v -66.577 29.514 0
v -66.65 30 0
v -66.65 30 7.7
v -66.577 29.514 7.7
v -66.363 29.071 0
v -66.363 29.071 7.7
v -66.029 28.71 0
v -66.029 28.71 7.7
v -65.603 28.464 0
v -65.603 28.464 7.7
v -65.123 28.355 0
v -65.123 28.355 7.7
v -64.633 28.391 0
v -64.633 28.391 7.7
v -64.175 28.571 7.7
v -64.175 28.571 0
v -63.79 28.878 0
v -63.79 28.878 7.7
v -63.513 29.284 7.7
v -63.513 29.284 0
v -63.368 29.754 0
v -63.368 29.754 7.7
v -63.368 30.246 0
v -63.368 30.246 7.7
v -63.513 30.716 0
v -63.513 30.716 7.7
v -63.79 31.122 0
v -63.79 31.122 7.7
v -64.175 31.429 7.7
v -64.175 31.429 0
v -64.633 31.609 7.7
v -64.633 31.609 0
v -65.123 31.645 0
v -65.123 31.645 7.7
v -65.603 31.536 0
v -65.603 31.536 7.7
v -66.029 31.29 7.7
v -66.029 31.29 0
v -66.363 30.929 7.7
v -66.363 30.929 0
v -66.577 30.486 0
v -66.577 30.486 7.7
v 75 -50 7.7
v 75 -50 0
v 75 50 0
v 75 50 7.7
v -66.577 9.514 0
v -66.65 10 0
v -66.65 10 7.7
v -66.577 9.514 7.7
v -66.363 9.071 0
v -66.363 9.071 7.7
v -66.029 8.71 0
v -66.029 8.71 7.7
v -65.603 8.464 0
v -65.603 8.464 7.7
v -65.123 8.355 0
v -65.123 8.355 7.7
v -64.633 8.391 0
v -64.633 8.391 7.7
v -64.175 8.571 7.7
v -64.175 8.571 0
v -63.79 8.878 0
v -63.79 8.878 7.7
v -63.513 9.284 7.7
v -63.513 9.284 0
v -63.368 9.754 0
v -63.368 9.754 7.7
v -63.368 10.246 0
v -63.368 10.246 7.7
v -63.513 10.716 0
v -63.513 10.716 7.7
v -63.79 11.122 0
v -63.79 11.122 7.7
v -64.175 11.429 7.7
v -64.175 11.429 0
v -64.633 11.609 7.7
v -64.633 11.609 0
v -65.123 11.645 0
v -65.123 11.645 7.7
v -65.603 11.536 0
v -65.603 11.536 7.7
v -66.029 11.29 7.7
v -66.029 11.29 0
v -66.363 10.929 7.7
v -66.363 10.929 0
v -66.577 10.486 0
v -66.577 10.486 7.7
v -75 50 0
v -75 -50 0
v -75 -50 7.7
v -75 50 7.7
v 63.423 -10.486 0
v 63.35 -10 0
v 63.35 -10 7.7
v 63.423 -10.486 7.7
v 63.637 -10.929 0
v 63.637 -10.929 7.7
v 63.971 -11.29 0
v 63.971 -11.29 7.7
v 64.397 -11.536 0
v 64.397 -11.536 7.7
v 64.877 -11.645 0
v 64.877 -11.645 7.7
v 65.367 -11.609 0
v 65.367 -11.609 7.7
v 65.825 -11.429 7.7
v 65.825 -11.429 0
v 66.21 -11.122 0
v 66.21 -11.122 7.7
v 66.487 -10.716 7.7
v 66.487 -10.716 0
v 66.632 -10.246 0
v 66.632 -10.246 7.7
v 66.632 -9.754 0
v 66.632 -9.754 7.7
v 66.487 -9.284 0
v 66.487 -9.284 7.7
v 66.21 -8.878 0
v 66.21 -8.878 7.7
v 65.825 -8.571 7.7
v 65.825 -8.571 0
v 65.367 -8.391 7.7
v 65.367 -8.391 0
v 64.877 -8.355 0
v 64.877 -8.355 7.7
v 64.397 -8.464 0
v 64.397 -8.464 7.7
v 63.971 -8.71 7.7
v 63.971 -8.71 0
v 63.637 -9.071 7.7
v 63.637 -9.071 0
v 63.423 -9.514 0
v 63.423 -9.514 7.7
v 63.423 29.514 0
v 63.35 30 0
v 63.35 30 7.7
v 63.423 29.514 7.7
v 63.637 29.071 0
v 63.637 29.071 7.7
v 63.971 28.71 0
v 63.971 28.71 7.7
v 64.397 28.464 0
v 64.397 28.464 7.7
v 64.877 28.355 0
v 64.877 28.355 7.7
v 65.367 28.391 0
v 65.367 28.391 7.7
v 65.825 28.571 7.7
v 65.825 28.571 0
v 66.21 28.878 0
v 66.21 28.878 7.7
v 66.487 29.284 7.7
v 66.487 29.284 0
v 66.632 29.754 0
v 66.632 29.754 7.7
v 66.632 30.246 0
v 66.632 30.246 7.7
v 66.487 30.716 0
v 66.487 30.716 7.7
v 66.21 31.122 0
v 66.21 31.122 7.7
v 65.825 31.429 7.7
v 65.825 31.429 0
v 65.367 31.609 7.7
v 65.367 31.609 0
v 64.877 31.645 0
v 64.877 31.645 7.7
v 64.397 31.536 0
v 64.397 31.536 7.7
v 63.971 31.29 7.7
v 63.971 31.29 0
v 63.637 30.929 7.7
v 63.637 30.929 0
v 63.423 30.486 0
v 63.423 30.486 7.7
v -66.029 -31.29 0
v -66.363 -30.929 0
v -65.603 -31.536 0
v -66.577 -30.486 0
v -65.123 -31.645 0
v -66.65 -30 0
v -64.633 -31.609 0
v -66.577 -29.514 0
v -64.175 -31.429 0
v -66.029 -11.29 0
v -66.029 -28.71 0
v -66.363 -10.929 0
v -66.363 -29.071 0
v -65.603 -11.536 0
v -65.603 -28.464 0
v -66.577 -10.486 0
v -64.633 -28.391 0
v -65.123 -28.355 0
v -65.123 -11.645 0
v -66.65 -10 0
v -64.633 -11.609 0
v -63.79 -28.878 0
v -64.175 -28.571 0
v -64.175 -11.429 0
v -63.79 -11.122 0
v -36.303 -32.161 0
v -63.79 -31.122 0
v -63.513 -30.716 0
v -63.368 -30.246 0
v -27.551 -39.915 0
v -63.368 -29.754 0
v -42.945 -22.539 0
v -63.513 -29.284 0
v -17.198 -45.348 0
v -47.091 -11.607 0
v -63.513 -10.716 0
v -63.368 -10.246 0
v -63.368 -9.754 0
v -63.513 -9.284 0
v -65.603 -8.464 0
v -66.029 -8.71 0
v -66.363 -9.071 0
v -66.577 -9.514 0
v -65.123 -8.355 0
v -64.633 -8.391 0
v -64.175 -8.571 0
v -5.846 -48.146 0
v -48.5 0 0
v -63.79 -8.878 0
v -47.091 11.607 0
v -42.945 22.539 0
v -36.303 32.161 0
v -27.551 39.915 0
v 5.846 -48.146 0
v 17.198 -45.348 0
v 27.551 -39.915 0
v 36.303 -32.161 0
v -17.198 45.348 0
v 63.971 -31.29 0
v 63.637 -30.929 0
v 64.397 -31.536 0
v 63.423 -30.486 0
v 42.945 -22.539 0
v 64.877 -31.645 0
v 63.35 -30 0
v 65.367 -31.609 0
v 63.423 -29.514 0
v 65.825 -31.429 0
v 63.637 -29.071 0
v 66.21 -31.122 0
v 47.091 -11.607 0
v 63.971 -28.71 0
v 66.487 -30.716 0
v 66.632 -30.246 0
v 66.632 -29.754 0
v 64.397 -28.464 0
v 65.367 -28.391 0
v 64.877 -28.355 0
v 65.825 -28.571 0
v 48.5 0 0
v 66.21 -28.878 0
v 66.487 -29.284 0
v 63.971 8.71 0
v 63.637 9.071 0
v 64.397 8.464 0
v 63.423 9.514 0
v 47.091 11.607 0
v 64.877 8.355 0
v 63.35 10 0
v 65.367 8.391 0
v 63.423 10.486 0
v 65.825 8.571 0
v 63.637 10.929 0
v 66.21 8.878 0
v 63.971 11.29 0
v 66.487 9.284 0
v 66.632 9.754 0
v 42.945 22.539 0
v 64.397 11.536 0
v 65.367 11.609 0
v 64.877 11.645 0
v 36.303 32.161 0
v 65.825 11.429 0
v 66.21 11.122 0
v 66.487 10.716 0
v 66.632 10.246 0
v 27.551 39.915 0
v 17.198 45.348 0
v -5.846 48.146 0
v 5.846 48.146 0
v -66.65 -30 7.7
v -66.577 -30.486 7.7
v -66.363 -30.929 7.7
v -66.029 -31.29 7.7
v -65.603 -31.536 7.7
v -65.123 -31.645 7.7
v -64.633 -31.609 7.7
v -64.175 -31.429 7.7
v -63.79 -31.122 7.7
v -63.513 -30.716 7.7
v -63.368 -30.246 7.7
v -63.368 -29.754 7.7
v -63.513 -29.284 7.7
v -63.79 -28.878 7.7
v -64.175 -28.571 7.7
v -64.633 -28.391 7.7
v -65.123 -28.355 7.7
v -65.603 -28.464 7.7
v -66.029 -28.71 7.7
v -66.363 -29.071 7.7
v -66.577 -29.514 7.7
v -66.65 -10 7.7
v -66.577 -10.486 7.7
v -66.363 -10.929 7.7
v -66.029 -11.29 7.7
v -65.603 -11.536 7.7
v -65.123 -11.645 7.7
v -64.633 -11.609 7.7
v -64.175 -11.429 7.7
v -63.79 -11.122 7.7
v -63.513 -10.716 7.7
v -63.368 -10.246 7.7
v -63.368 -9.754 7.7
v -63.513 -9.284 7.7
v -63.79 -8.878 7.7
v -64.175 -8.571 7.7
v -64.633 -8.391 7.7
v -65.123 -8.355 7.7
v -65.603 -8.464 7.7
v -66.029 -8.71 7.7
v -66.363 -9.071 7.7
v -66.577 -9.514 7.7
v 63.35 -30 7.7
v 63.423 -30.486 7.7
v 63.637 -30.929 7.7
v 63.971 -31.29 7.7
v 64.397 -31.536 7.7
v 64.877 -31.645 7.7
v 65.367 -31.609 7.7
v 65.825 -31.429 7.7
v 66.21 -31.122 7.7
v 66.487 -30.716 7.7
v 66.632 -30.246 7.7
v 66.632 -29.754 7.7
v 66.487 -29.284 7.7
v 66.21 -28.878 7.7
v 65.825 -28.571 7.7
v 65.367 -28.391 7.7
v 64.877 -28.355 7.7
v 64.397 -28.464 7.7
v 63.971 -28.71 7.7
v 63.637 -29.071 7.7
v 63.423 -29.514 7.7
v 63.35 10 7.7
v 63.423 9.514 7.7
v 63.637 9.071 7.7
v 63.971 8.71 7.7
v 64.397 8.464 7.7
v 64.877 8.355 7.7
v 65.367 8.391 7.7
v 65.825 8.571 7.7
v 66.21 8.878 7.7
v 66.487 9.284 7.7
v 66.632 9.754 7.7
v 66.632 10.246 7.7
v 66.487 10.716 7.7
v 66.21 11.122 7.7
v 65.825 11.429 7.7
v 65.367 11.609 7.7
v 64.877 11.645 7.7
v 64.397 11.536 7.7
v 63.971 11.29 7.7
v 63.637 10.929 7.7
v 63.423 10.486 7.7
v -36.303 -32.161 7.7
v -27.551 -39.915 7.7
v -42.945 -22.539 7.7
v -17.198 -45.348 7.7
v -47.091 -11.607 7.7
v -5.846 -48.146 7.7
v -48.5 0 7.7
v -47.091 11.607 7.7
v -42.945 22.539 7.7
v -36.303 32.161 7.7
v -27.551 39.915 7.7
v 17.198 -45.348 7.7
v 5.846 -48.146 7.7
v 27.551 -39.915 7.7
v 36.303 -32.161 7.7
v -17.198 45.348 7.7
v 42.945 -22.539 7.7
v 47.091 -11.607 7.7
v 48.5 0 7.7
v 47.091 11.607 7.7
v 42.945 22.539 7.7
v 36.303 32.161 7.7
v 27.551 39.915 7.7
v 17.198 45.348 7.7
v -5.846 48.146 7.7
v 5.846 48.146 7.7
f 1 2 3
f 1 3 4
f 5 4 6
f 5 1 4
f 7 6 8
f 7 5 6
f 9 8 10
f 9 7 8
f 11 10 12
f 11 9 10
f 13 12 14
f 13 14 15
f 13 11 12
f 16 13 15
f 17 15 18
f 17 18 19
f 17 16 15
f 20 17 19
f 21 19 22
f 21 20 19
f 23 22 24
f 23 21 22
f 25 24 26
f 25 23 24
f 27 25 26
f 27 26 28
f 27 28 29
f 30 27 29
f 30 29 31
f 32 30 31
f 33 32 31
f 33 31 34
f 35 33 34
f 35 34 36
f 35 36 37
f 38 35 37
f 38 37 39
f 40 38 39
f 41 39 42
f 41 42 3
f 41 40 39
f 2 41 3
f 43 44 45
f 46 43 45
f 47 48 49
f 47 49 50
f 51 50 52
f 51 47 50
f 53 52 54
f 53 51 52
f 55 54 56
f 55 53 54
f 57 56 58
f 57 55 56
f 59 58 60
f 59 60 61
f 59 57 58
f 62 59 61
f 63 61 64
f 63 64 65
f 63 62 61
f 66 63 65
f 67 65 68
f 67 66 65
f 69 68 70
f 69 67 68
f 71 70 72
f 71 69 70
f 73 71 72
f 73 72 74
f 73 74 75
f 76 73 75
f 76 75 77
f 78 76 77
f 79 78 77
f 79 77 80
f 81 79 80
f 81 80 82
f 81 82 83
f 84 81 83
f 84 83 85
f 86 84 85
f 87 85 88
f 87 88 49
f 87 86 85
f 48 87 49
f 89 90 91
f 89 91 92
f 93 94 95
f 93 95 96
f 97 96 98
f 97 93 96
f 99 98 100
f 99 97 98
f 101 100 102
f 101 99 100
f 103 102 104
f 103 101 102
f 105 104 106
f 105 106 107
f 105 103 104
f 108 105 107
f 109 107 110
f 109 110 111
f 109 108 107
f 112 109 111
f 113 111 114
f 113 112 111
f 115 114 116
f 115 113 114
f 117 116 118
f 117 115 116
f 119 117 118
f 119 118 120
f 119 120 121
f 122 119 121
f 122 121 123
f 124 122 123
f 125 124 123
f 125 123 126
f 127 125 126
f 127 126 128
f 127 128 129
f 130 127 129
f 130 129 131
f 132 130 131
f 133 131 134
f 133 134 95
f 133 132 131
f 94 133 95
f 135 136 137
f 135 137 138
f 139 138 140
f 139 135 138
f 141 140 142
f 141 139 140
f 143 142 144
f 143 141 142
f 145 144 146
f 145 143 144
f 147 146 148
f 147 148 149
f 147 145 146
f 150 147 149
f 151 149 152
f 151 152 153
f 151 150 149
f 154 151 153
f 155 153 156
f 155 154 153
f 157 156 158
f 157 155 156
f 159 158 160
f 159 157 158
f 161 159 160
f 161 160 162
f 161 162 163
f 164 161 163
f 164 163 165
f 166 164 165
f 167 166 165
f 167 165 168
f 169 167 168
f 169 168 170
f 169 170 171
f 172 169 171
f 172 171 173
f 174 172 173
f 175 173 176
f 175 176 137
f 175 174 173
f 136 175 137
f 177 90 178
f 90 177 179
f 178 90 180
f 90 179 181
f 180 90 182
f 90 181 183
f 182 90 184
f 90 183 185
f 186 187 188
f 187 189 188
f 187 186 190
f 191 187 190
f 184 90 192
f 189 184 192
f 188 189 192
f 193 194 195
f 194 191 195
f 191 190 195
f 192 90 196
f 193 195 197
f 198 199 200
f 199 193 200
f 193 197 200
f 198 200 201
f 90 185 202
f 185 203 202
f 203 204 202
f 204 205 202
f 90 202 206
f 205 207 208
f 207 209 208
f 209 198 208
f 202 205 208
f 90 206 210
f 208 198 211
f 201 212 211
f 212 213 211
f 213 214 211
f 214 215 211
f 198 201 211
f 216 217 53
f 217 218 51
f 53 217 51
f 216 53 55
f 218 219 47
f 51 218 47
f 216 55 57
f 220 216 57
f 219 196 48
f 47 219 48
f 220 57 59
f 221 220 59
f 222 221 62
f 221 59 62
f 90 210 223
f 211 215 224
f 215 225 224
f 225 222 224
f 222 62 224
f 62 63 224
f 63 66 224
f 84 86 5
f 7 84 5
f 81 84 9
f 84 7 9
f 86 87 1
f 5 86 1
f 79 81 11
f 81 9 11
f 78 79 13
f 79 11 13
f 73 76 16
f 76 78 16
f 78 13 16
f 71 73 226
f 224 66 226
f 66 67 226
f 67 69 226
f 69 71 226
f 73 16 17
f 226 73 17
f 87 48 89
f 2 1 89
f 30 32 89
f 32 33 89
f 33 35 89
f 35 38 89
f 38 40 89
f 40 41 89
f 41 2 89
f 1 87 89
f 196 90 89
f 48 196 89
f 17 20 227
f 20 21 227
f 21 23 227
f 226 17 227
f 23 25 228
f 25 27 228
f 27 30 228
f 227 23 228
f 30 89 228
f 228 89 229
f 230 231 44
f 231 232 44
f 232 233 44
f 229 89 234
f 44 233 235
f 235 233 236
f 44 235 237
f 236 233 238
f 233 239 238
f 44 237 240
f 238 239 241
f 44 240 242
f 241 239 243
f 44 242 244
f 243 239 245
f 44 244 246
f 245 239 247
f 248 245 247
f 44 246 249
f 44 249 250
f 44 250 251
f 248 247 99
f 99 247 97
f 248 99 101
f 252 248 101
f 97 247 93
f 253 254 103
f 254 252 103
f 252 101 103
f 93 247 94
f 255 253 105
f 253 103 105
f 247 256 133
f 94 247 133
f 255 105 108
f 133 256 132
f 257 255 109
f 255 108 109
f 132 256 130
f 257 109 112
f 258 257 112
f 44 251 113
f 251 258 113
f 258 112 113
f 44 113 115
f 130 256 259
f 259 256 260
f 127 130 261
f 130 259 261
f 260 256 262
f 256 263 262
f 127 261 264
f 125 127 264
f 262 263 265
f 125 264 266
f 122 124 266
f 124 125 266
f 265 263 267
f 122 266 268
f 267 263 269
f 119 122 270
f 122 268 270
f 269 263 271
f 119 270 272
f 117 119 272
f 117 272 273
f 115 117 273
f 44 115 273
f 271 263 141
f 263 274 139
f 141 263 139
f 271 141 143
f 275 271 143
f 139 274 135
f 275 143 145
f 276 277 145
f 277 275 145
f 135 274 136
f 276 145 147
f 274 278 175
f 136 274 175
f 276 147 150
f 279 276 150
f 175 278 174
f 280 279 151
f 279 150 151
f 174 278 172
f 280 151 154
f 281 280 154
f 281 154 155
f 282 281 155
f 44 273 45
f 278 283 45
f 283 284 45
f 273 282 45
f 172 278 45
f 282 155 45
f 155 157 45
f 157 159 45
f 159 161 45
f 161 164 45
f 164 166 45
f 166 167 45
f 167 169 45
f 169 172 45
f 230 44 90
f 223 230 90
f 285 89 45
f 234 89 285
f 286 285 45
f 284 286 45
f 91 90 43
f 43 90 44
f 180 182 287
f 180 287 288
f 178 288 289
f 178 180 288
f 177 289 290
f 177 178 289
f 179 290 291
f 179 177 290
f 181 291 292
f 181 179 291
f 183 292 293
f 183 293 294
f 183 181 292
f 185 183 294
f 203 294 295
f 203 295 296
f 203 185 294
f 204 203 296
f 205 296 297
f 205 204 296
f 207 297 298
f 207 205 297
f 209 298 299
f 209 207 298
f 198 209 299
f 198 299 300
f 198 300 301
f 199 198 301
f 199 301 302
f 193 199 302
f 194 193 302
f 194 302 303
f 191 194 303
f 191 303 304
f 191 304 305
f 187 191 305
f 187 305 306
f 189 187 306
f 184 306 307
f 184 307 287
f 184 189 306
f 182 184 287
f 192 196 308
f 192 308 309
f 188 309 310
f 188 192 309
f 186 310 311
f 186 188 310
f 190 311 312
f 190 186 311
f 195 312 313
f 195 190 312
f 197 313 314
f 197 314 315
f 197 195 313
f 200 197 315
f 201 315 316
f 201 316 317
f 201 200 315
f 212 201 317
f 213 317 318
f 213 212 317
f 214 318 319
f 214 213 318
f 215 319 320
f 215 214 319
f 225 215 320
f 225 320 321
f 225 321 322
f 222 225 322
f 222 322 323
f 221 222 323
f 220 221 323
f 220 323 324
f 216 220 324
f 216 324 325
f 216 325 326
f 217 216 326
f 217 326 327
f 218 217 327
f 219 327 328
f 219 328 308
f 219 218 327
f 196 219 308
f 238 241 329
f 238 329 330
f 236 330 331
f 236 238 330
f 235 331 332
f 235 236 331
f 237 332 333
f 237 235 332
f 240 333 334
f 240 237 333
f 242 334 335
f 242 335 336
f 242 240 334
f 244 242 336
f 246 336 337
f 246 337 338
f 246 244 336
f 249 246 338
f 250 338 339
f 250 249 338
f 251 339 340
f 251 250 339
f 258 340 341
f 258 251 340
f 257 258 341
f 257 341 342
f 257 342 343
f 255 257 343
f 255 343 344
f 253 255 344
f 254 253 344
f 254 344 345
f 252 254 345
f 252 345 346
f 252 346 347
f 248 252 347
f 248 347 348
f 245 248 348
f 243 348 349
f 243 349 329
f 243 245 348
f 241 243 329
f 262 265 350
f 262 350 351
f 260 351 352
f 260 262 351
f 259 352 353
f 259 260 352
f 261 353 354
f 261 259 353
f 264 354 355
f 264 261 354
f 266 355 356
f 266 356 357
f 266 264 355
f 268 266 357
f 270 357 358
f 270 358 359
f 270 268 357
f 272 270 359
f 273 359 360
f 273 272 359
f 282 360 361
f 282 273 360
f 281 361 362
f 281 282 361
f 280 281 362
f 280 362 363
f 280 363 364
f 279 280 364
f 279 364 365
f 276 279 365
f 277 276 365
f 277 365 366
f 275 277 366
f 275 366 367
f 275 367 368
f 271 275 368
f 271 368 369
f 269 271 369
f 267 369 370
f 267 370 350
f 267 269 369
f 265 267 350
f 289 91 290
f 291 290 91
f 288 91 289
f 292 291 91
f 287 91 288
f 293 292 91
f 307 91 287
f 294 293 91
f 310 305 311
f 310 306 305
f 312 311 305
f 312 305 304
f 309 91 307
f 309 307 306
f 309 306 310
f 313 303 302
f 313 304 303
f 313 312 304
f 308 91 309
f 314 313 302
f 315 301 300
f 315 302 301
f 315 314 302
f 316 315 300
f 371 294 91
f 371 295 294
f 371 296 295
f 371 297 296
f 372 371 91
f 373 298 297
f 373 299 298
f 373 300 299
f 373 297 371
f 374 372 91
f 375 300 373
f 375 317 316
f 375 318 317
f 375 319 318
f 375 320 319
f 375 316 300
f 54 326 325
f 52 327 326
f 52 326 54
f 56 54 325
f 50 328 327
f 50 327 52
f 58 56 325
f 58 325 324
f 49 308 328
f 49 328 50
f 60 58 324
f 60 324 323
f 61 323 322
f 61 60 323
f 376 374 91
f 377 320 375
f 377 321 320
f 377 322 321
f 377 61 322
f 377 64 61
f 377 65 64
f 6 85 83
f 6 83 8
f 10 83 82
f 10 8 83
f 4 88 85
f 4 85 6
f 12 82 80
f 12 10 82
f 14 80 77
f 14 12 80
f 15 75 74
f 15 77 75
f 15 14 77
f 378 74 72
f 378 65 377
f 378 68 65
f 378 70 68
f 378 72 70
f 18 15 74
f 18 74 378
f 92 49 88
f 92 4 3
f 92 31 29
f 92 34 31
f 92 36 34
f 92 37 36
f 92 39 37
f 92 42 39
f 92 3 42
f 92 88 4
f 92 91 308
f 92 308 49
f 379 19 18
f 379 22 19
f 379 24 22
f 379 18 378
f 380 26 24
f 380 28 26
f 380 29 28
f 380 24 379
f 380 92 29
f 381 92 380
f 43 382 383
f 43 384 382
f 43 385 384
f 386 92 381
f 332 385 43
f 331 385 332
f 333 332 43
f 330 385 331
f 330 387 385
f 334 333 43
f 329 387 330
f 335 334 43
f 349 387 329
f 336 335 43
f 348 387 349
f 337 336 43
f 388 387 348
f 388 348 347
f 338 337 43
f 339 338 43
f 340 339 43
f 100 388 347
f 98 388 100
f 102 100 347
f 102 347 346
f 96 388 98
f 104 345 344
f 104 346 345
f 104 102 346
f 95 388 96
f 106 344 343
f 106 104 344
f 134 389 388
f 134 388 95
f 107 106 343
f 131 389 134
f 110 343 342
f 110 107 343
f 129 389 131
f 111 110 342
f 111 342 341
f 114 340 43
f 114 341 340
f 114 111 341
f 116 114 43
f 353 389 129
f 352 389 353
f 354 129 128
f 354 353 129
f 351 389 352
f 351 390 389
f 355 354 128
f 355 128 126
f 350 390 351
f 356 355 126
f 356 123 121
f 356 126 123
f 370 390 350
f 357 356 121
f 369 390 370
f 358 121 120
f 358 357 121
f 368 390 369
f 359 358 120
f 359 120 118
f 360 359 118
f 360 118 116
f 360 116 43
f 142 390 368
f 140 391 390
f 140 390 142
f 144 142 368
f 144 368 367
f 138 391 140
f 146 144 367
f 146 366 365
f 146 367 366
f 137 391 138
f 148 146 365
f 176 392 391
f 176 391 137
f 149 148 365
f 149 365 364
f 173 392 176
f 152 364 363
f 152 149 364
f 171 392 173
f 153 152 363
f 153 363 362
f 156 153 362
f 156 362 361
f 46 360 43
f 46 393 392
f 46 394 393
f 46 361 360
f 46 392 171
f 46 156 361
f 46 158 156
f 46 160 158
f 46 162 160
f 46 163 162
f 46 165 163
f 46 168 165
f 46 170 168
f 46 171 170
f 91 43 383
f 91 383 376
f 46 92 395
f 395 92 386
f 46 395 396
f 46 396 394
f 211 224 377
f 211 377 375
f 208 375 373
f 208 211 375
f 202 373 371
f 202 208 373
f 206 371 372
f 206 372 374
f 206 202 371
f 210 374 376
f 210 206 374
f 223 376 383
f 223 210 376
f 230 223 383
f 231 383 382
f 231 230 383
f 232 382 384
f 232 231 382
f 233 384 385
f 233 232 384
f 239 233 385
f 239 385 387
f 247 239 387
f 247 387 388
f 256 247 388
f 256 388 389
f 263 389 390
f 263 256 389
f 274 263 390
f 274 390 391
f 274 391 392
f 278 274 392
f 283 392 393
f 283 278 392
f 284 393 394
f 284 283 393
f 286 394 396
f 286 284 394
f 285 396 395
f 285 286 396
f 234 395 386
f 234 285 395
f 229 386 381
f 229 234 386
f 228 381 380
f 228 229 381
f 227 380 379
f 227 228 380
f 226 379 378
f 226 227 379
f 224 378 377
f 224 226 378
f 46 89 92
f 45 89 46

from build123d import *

# Parameters (mm, degrees)
SKETCH_1_W      = 150
SKETCH_1_H      = 100
SKETCH_1_R      = 1.65
SKETCH_1_R_2    = 48.5
EXTRUDE_1_DEPTH = 7.7


with BuildPart() as part:
    # 草图1 → 凸台-拉伸1 (new body)
    with BuildSketch(Plane.XY):
        Rectangle(SKETCH_1_W, SKETCH_1_H)
        with Locations(Location((-65, 30, 0), (0, 0, 180))):
            Circle(SKETCH_1_R, mode=Mode.SUBTRACT)
        with Locations(Location((-65, 10, 0), (0, 0, 180))):
            Circle(SKETCH_1_R, mode=Mode.SUBTRACT)
        with Locations(Location((-65, -10, 0), (0, 0, 180))):
            Circle(SKETCH_1_R, mode=Mode.SUBTRACT)
        with Locations(Location((-65, -30, 0), (0, 0, 180))):
            Circle(SKETCH_1_R, mode=Mode.SUBTRACT)
        with Locations(Location((65, -30, 0), (0, 0, 180))):
            Circle(SKETCH_1_R, mode=Mode.SUBTRACT)
        with Locations(Location((65, -10, 0), (0, 0, 180))):
            Circle(SKETCH_1_R, mode=Mode.SUBTRACT)
        with Locations(Location((65, 10, 0), (0, 0, 180))):
            Circle(SKETCH_1_R, mode=Mode.SUBTRACT)
        with Locations(Location((65, 30, 0), (0, 0, 180))):
            Circle(SKETCH_1_R, mode=Mode.SUBTRACT)
        with Locations(Location((0, 0, 0), (0, 0, 180))):
            Circle(SKETCH_1_R_2, mode=Mode.SUBTRACT)
    extrude(amount=EXTRUDE_1_DEPTH)


solid = part.part
